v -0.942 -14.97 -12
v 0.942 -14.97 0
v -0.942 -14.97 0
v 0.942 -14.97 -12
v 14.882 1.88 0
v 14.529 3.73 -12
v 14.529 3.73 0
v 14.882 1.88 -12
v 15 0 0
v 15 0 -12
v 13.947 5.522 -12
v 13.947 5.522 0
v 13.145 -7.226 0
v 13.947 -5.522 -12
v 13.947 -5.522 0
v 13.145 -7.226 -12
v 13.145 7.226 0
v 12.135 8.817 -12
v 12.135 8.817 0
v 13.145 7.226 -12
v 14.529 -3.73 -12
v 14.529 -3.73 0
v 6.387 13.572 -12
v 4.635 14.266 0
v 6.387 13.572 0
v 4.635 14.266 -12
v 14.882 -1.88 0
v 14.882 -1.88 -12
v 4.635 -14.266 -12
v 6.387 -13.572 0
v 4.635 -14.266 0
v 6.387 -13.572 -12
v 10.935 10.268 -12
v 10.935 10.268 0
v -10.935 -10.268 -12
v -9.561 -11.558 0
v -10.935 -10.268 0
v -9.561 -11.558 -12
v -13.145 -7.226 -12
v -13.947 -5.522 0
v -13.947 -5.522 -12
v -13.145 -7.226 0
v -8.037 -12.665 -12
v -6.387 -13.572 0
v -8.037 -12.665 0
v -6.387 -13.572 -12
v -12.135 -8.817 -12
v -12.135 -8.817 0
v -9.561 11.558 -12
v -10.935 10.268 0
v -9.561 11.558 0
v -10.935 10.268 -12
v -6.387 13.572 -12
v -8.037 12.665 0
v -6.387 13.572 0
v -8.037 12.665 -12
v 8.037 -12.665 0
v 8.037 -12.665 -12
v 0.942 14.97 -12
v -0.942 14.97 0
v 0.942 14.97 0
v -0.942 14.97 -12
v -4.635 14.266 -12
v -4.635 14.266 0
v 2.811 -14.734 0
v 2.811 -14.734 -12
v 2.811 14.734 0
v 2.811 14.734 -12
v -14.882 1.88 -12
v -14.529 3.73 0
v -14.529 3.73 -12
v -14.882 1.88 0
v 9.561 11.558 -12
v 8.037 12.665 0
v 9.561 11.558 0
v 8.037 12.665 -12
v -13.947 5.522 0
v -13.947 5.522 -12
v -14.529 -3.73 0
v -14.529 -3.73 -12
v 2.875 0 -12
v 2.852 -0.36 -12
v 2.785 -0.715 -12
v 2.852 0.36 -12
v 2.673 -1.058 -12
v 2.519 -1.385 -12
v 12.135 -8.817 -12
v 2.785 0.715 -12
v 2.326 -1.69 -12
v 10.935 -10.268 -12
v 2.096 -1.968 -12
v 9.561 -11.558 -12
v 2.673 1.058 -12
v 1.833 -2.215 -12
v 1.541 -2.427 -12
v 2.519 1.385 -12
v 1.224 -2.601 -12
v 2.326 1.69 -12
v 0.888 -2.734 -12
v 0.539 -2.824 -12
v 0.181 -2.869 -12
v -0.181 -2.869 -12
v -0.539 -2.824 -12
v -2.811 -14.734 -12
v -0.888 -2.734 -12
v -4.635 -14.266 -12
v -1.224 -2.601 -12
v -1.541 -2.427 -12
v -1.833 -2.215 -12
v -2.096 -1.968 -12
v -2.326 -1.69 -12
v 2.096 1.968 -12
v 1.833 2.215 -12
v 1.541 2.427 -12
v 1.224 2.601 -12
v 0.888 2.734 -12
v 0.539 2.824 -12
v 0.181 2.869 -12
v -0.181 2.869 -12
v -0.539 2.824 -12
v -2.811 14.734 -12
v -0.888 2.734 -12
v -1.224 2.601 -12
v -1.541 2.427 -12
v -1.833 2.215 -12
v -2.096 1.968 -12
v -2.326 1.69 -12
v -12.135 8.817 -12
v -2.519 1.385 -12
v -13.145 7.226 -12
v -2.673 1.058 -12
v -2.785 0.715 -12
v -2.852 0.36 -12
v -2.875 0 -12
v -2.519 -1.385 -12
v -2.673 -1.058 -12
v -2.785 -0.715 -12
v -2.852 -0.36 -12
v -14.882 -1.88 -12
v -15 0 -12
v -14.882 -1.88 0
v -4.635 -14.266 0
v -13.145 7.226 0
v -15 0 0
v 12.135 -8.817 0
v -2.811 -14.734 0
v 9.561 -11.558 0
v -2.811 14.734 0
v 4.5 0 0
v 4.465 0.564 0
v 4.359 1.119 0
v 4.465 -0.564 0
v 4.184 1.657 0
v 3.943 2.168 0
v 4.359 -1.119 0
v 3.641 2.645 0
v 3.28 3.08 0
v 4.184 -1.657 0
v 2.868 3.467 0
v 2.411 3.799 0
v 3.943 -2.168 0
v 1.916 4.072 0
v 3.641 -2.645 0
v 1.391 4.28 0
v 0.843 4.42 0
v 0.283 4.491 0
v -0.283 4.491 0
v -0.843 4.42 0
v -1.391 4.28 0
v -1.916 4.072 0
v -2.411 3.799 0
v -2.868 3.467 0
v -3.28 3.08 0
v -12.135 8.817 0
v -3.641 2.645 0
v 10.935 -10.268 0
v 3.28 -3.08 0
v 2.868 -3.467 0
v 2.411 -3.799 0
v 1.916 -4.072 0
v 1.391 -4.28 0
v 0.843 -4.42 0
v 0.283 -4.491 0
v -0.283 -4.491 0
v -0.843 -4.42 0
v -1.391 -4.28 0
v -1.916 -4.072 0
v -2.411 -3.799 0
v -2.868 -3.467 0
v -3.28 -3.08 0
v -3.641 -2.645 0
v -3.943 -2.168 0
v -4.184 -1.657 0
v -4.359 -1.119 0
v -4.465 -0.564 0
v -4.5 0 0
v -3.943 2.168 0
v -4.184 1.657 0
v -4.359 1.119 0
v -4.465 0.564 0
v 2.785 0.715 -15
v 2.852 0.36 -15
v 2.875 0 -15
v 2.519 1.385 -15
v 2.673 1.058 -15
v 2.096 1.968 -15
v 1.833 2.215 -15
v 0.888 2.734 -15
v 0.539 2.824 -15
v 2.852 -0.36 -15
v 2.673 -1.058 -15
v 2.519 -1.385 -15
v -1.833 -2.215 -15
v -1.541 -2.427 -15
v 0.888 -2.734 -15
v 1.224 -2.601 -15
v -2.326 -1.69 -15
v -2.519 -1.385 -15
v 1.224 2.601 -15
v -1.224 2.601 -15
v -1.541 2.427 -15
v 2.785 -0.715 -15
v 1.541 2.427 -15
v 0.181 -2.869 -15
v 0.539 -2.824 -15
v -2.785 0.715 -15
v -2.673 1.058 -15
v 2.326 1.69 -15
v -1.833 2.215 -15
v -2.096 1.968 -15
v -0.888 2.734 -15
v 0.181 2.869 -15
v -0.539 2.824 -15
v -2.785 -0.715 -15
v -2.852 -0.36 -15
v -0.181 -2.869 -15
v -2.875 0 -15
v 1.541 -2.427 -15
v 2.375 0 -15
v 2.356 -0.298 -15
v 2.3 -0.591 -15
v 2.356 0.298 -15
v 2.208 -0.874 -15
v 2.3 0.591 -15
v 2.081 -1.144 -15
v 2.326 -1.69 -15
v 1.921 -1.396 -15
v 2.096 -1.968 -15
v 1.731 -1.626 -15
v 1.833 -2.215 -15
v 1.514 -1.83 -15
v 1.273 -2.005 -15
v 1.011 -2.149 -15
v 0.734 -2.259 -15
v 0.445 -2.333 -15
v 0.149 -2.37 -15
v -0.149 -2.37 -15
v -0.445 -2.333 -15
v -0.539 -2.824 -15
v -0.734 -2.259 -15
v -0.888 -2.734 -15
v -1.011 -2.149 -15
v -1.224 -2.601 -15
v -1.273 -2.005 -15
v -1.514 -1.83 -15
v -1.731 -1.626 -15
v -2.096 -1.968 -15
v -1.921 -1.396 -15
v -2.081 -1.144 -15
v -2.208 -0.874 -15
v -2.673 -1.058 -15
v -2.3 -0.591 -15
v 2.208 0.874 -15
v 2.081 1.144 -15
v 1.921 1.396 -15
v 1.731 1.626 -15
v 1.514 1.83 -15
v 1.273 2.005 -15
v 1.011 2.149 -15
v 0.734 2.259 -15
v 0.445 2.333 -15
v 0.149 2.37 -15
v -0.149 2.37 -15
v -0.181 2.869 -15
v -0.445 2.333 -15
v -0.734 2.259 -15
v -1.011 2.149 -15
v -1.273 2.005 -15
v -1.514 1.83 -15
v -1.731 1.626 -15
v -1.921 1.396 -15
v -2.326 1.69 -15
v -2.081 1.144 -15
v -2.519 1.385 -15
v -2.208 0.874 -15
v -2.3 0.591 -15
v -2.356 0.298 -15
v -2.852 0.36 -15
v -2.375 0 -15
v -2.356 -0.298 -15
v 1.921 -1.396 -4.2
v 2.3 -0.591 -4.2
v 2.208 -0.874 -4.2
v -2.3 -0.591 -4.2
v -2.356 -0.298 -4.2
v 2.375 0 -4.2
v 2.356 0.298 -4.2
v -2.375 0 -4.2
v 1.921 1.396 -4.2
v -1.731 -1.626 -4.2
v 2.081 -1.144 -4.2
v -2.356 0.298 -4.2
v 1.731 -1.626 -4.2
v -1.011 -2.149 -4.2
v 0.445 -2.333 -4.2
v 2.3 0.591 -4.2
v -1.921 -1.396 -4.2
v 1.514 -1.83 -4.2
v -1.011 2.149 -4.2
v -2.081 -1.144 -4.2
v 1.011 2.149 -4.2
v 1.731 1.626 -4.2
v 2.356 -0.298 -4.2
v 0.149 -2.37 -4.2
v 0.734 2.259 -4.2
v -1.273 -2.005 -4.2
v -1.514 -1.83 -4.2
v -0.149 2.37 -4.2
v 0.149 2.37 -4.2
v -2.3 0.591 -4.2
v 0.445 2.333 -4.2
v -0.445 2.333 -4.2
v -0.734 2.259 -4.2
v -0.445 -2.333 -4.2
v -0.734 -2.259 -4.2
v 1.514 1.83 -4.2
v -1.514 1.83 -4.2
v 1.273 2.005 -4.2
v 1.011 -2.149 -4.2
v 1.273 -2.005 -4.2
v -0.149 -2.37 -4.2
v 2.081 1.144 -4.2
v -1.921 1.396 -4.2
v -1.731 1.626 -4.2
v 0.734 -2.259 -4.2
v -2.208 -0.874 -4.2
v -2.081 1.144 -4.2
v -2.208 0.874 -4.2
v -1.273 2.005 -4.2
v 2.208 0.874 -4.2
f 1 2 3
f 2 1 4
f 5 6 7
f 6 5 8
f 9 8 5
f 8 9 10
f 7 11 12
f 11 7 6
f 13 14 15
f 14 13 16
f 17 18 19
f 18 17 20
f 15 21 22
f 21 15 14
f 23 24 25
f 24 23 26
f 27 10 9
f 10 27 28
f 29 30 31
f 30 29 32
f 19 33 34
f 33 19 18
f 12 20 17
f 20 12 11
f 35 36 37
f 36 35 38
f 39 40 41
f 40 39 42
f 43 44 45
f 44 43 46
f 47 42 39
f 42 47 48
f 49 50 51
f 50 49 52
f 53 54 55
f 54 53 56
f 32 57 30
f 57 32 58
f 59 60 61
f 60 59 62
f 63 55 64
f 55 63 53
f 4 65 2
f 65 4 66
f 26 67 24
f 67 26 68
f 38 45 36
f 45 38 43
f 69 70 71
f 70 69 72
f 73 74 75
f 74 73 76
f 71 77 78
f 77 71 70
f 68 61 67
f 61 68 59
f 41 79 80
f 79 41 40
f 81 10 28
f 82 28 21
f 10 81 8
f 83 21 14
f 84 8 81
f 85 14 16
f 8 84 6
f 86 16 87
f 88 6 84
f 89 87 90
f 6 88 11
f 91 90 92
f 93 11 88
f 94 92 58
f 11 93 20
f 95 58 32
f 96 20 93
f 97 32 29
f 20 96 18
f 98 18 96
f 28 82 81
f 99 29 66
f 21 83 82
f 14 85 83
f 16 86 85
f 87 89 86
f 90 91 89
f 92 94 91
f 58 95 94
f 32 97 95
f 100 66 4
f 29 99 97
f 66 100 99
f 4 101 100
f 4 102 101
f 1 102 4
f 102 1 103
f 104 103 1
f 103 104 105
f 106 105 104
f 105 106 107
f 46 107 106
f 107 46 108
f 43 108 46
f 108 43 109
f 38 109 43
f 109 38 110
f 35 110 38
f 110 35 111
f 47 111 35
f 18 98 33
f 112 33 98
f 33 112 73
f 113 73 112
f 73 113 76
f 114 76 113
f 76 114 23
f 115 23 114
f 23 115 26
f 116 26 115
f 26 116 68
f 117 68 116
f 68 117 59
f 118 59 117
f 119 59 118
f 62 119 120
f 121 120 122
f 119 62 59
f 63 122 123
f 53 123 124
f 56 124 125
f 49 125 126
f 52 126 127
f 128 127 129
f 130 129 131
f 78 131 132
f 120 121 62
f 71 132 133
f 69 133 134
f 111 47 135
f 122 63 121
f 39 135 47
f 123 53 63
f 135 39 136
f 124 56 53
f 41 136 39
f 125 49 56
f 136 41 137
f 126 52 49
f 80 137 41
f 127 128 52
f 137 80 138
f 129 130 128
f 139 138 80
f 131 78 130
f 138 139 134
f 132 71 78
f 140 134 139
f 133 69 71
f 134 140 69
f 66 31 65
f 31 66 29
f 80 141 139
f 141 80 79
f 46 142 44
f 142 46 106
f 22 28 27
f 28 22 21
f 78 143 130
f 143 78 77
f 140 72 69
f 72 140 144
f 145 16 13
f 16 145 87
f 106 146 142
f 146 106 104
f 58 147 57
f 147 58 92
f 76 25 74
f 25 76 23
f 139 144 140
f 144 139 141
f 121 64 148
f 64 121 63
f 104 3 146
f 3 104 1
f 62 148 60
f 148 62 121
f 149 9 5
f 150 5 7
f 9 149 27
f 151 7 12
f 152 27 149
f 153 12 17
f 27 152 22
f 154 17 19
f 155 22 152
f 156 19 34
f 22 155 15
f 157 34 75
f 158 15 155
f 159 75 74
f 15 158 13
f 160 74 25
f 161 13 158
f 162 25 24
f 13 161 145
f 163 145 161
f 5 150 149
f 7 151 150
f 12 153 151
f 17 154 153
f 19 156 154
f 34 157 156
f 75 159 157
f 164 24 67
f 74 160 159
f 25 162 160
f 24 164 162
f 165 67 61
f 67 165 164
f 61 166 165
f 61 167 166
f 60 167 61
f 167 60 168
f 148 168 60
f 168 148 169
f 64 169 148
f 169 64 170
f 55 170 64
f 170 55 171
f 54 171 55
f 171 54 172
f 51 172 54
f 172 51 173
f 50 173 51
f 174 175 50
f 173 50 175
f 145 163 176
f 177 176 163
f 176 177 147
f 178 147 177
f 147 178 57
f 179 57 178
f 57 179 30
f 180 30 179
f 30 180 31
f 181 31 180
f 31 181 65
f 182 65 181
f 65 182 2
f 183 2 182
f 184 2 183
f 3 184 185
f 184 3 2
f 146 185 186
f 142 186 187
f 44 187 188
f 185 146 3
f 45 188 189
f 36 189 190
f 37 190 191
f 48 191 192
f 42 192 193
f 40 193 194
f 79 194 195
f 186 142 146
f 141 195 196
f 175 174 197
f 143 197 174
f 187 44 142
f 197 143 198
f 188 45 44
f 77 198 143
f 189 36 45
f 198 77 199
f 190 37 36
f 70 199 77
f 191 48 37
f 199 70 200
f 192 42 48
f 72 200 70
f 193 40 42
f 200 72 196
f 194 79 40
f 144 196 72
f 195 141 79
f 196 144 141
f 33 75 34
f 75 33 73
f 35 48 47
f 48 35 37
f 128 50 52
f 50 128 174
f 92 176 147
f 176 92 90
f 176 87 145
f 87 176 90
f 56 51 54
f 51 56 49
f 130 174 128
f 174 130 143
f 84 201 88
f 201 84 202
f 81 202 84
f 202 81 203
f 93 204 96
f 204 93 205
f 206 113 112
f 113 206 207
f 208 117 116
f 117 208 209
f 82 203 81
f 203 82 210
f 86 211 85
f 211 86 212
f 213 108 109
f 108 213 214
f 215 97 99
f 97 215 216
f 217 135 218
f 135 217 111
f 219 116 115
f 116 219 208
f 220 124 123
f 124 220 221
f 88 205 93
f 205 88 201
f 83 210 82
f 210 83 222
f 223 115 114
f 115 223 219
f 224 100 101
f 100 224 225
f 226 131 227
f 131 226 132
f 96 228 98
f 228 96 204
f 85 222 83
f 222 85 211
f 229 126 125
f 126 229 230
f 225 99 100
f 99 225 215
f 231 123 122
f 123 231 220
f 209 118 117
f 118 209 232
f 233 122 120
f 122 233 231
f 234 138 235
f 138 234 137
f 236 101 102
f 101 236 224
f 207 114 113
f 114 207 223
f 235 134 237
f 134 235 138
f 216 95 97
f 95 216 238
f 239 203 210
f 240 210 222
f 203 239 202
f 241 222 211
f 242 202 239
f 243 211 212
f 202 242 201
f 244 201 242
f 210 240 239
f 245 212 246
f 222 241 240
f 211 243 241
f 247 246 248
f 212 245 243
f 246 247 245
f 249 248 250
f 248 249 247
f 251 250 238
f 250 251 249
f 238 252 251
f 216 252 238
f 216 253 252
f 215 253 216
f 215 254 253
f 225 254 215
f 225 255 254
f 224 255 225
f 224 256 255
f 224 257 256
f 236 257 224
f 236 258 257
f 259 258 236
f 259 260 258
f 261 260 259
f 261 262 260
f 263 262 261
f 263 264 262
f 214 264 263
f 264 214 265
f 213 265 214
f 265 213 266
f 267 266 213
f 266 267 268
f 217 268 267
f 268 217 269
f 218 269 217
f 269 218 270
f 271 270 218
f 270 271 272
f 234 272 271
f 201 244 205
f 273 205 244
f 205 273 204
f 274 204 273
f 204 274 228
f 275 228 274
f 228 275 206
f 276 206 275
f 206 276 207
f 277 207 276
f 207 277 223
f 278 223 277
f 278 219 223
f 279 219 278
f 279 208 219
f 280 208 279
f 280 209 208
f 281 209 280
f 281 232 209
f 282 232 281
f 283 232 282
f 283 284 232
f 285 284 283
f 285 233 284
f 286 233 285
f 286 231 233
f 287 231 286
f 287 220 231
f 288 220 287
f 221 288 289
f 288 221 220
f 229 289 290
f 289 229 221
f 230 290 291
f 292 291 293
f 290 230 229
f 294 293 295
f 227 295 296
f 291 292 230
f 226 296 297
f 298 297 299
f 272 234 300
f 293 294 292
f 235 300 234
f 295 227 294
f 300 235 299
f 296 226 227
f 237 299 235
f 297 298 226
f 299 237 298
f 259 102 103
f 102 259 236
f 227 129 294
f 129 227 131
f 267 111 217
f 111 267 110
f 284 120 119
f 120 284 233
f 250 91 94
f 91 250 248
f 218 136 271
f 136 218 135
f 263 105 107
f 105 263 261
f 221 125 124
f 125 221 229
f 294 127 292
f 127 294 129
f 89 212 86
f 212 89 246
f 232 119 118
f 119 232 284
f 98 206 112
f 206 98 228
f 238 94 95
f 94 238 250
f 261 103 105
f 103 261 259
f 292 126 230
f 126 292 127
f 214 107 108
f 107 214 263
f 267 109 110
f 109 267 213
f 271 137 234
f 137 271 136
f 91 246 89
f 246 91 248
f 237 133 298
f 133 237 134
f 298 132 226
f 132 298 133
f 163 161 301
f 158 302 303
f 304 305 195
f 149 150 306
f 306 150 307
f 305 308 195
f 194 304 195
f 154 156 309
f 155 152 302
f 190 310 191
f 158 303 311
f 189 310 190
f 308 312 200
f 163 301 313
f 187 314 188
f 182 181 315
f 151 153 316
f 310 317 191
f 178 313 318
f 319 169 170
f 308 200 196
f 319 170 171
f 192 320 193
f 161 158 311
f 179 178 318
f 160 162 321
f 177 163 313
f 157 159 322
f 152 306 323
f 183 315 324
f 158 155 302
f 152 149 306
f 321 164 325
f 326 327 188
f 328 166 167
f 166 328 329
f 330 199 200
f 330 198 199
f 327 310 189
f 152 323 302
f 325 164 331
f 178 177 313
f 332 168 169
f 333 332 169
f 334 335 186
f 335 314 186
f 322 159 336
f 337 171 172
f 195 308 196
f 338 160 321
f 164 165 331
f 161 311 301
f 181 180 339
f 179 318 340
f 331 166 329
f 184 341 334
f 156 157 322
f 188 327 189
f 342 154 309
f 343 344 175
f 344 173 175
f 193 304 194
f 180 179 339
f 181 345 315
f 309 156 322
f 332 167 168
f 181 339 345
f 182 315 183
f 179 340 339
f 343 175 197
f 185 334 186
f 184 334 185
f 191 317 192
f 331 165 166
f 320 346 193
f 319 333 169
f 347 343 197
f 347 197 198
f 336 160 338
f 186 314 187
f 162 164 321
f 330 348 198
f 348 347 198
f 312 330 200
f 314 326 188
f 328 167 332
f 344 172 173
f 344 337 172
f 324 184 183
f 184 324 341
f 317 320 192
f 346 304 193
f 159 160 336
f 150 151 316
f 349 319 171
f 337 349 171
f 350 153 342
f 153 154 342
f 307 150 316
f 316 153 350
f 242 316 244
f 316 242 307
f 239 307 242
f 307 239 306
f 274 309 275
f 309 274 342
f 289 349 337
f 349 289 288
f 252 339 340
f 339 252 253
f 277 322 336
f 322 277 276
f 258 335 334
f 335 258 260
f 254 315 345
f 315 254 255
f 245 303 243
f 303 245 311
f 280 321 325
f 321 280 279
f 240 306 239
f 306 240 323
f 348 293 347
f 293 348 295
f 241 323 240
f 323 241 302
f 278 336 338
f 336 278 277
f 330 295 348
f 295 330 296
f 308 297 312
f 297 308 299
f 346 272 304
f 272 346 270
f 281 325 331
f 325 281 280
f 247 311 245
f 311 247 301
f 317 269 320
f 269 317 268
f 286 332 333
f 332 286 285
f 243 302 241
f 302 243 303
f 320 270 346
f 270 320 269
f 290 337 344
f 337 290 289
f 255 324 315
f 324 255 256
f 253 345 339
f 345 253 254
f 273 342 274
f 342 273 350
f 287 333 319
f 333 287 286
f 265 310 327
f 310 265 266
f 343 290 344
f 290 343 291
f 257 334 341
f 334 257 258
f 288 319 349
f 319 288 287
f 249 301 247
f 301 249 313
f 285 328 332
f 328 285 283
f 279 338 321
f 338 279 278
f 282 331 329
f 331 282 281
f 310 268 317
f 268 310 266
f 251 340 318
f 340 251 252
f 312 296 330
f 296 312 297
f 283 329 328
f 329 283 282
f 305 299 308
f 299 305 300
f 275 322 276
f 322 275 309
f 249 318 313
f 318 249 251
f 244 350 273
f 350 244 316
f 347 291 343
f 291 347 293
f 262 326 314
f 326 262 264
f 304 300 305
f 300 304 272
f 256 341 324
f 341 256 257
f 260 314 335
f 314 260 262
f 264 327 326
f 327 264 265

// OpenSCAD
$fn = 50;

difference() {
	union() {
		translate(v = [0, 0, -12.0]) {
			cylinder(h = 12, r = 15.0);
		}
		#translate(v = [0, 0, -15.0]) {
			cylinder(h = 15, r = 2.875);
		}
	}
	union() {
		translate(v = [0, 0, 0]) {
			rotate(a = [0, 0, 0]) {
				difference() {
					union() {
						translate(v = [0, 0, -15.0]) {
							cylinder(h = 15, r = 2.25);
						}
						translate(v = [0, 0, -4.2]) {
							cylinder(h = 4.2, r1 = 2.375, r2 = 4.5);
						}
						translate(v = [0, 0, -15.0]) {
							cylinder(h = 15, r = 2.375);
						}
						translate(v = [0, 0, -15.0]) {
							cylinder(h = 15, r = 2.25);
						}
					}
					union();
				}
			}
		}
	}
}
